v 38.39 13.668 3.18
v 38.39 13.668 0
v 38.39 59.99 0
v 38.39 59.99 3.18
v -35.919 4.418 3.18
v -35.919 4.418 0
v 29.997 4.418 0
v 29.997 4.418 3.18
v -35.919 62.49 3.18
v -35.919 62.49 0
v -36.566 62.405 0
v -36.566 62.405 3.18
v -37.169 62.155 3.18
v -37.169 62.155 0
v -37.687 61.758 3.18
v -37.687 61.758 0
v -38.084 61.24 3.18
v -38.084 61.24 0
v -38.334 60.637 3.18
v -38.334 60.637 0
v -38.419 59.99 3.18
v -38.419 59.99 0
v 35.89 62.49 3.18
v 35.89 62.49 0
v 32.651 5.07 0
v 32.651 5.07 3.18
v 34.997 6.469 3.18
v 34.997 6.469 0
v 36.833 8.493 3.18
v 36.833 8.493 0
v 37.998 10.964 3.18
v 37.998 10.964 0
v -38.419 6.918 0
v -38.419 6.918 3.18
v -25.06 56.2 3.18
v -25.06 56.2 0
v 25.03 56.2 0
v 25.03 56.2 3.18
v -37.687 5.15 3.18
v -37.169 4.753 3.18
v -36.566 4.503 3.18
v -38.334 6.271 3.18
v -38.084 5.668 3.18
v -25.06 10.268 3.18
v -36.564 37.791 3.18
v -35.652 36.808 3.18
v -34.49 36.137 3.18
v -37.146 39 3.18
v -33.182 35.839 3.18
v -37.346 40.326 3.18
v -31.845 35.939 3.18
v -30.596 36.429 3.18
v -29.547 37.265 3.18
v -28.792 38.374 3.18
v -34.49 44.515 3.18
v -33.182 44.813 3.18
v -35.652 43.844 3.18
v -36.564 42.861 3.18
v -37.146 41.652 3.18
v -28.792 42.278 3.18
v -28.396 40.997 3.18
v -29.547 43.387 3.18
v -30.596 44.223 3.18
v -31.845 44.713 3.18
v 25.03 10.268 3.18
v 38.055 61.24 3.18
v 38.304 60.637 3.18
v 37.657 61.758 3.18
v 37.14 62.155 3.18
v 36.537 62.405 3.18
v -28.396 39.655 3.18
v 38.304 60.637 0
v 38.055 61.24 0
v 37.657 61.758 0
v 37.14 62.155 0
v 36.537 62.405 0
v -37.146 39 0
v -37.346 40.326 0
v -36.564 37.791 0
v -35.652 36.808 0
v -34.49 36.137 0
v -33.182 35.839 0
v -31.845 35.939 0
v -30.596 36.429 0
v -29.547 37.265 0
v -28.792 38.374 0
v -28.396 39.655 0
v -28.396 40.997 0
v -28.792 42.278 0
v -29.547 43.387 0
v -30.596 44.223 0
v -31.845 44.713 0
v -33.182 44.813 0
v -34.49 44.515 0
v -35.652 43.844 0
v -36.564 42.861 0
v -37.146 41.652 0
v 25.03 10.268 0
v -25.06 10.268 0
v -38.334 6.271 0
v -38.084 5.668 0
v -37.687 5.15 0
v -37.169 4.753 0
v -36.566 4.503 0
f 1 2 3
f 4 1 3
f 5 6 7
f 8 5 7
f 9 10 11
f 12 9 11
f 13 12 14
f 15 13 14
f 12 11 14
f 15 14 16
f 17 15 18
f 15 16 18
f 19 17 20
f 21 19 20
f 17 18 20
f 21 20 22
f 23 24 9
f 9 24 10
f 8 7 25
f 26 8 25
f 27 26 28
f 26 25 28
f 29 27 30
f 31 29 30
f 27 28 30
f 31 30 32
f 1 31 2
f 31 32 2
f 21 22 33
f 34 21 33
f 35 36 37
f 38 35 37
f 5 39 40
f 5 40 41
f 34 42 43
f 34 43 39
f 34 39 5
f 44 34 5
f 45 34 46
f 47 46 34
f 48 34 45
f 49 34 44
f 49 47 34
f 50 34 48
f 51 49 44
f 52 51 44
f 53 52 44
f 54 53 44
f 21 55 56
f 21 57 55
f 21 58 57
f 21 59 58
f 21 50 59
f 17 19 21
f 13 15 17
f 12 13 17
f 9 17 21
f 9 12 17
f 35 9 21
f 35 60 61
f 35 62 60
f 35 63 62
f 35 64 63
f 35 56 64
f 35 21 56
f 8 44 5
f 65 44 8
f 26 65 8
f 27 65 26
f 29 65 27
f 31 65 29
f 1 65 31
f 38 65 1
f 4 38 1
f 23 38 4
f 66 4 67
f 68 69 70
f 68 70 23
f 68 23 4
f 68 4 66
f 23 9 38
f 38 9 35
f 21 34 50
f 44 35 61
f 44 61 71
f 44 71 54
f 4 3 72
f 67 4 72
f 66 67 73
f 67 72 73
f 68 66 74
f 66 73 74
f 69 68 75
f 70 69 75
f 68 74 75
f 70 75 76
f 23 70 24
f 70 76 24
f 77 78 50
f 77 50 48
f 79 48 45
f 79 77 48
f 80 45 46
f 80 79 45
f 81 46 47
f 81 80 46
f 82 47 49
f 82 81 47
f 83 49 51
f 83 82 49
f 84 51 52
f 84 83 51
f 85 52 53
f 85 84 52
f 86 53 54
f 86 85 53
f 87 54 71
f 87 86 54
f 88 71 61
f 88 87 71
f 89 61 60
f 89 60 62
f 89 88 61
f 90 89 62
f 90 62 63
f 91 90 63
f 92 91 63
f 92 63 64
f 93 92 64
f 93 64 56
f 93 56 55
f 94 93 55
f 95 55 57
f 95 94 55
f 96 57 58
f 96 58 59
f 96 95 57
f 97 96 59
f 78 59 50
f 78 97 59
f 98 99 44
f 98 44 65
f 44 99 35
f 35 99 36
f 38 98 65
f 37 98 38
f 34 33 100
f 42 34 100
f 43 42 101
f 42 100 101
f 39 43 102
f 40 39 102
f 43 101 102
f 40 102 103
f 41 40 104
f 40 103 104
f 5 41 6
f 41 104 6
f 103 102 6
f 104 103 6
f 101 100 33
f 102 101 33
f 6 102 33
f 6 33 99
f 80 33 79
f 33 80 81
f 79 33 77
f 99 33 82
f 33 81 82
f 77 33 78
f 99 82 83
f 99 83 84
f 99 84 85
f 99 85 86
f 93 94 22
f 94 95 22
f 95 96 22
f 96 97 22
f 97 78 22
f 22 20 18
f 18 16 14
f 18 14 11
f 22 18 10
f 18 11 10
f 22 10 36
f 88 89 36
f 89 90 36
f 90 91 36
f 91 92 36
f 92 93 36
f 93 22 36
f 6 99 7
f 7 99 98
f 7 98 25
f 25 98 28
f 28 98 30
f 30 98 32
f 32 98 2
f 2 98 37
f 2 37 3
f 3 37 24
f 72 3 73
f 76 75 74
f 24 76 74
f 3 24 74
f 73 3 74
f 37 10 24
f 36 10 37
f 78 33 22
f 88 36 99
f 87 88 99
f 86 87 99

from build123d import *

# Parameters (mm, degrees)
SKETCH1_R   = 4.5
SKETCH1_W   = 50.090098238
SKETCH1_H   = 45.932062837
BEZEL_DEPTH = 3.18


with BuildPart() as part:
    # Sketch1 → Bezel (new body)
    with BuildSketch(Plane.XY):
        with BuildLine():
            Line((-35.919151108, 4.418014642), (29.997375098, 4.418014642))
            ThreePointArc((29.997375098, 4.418014642), (35.990372343, 7.41277043), (38.389642662, 13.668014642))
            Line((38.389642662, 13.668014642), (38.389642662, 59.990077479))
            ThreePointArc((38.389642662, 59.990077479), (37.657409615, 61.757844432), (35.889642662, 62.490077479))
            Line((35.889642662, 62.490077479), (-35.919151108, 62.490077479))
            ThreePointArc((-35.919151108, 62.490077479), (-37.686918061, 61.757844432), (-38.419151108, 59.990077479))
            Line((-38.419151108, 59.990077479), (-38.419151108, 6.918014642))
            ThreePointArc((-38.419151108, 6.918014642), (-37.686918061, 5.150247689), (-35.919151108, 4.418014642))
        make_face()
        with Locations(Location((-32.845865367, 40.325993685, 0), (0, 0, 180))):
            Circle(SKETCH1_R, mode=Mode.SUBTRACT)
        with Locations((-0.014754223, 33.23404606)):
            Rectangle(SKETCH1_W, SKETCH1_H, mode=Mode.SUBTRACT)
    extrude(amount=BEZEL_DEPTH)


solid = part.part
